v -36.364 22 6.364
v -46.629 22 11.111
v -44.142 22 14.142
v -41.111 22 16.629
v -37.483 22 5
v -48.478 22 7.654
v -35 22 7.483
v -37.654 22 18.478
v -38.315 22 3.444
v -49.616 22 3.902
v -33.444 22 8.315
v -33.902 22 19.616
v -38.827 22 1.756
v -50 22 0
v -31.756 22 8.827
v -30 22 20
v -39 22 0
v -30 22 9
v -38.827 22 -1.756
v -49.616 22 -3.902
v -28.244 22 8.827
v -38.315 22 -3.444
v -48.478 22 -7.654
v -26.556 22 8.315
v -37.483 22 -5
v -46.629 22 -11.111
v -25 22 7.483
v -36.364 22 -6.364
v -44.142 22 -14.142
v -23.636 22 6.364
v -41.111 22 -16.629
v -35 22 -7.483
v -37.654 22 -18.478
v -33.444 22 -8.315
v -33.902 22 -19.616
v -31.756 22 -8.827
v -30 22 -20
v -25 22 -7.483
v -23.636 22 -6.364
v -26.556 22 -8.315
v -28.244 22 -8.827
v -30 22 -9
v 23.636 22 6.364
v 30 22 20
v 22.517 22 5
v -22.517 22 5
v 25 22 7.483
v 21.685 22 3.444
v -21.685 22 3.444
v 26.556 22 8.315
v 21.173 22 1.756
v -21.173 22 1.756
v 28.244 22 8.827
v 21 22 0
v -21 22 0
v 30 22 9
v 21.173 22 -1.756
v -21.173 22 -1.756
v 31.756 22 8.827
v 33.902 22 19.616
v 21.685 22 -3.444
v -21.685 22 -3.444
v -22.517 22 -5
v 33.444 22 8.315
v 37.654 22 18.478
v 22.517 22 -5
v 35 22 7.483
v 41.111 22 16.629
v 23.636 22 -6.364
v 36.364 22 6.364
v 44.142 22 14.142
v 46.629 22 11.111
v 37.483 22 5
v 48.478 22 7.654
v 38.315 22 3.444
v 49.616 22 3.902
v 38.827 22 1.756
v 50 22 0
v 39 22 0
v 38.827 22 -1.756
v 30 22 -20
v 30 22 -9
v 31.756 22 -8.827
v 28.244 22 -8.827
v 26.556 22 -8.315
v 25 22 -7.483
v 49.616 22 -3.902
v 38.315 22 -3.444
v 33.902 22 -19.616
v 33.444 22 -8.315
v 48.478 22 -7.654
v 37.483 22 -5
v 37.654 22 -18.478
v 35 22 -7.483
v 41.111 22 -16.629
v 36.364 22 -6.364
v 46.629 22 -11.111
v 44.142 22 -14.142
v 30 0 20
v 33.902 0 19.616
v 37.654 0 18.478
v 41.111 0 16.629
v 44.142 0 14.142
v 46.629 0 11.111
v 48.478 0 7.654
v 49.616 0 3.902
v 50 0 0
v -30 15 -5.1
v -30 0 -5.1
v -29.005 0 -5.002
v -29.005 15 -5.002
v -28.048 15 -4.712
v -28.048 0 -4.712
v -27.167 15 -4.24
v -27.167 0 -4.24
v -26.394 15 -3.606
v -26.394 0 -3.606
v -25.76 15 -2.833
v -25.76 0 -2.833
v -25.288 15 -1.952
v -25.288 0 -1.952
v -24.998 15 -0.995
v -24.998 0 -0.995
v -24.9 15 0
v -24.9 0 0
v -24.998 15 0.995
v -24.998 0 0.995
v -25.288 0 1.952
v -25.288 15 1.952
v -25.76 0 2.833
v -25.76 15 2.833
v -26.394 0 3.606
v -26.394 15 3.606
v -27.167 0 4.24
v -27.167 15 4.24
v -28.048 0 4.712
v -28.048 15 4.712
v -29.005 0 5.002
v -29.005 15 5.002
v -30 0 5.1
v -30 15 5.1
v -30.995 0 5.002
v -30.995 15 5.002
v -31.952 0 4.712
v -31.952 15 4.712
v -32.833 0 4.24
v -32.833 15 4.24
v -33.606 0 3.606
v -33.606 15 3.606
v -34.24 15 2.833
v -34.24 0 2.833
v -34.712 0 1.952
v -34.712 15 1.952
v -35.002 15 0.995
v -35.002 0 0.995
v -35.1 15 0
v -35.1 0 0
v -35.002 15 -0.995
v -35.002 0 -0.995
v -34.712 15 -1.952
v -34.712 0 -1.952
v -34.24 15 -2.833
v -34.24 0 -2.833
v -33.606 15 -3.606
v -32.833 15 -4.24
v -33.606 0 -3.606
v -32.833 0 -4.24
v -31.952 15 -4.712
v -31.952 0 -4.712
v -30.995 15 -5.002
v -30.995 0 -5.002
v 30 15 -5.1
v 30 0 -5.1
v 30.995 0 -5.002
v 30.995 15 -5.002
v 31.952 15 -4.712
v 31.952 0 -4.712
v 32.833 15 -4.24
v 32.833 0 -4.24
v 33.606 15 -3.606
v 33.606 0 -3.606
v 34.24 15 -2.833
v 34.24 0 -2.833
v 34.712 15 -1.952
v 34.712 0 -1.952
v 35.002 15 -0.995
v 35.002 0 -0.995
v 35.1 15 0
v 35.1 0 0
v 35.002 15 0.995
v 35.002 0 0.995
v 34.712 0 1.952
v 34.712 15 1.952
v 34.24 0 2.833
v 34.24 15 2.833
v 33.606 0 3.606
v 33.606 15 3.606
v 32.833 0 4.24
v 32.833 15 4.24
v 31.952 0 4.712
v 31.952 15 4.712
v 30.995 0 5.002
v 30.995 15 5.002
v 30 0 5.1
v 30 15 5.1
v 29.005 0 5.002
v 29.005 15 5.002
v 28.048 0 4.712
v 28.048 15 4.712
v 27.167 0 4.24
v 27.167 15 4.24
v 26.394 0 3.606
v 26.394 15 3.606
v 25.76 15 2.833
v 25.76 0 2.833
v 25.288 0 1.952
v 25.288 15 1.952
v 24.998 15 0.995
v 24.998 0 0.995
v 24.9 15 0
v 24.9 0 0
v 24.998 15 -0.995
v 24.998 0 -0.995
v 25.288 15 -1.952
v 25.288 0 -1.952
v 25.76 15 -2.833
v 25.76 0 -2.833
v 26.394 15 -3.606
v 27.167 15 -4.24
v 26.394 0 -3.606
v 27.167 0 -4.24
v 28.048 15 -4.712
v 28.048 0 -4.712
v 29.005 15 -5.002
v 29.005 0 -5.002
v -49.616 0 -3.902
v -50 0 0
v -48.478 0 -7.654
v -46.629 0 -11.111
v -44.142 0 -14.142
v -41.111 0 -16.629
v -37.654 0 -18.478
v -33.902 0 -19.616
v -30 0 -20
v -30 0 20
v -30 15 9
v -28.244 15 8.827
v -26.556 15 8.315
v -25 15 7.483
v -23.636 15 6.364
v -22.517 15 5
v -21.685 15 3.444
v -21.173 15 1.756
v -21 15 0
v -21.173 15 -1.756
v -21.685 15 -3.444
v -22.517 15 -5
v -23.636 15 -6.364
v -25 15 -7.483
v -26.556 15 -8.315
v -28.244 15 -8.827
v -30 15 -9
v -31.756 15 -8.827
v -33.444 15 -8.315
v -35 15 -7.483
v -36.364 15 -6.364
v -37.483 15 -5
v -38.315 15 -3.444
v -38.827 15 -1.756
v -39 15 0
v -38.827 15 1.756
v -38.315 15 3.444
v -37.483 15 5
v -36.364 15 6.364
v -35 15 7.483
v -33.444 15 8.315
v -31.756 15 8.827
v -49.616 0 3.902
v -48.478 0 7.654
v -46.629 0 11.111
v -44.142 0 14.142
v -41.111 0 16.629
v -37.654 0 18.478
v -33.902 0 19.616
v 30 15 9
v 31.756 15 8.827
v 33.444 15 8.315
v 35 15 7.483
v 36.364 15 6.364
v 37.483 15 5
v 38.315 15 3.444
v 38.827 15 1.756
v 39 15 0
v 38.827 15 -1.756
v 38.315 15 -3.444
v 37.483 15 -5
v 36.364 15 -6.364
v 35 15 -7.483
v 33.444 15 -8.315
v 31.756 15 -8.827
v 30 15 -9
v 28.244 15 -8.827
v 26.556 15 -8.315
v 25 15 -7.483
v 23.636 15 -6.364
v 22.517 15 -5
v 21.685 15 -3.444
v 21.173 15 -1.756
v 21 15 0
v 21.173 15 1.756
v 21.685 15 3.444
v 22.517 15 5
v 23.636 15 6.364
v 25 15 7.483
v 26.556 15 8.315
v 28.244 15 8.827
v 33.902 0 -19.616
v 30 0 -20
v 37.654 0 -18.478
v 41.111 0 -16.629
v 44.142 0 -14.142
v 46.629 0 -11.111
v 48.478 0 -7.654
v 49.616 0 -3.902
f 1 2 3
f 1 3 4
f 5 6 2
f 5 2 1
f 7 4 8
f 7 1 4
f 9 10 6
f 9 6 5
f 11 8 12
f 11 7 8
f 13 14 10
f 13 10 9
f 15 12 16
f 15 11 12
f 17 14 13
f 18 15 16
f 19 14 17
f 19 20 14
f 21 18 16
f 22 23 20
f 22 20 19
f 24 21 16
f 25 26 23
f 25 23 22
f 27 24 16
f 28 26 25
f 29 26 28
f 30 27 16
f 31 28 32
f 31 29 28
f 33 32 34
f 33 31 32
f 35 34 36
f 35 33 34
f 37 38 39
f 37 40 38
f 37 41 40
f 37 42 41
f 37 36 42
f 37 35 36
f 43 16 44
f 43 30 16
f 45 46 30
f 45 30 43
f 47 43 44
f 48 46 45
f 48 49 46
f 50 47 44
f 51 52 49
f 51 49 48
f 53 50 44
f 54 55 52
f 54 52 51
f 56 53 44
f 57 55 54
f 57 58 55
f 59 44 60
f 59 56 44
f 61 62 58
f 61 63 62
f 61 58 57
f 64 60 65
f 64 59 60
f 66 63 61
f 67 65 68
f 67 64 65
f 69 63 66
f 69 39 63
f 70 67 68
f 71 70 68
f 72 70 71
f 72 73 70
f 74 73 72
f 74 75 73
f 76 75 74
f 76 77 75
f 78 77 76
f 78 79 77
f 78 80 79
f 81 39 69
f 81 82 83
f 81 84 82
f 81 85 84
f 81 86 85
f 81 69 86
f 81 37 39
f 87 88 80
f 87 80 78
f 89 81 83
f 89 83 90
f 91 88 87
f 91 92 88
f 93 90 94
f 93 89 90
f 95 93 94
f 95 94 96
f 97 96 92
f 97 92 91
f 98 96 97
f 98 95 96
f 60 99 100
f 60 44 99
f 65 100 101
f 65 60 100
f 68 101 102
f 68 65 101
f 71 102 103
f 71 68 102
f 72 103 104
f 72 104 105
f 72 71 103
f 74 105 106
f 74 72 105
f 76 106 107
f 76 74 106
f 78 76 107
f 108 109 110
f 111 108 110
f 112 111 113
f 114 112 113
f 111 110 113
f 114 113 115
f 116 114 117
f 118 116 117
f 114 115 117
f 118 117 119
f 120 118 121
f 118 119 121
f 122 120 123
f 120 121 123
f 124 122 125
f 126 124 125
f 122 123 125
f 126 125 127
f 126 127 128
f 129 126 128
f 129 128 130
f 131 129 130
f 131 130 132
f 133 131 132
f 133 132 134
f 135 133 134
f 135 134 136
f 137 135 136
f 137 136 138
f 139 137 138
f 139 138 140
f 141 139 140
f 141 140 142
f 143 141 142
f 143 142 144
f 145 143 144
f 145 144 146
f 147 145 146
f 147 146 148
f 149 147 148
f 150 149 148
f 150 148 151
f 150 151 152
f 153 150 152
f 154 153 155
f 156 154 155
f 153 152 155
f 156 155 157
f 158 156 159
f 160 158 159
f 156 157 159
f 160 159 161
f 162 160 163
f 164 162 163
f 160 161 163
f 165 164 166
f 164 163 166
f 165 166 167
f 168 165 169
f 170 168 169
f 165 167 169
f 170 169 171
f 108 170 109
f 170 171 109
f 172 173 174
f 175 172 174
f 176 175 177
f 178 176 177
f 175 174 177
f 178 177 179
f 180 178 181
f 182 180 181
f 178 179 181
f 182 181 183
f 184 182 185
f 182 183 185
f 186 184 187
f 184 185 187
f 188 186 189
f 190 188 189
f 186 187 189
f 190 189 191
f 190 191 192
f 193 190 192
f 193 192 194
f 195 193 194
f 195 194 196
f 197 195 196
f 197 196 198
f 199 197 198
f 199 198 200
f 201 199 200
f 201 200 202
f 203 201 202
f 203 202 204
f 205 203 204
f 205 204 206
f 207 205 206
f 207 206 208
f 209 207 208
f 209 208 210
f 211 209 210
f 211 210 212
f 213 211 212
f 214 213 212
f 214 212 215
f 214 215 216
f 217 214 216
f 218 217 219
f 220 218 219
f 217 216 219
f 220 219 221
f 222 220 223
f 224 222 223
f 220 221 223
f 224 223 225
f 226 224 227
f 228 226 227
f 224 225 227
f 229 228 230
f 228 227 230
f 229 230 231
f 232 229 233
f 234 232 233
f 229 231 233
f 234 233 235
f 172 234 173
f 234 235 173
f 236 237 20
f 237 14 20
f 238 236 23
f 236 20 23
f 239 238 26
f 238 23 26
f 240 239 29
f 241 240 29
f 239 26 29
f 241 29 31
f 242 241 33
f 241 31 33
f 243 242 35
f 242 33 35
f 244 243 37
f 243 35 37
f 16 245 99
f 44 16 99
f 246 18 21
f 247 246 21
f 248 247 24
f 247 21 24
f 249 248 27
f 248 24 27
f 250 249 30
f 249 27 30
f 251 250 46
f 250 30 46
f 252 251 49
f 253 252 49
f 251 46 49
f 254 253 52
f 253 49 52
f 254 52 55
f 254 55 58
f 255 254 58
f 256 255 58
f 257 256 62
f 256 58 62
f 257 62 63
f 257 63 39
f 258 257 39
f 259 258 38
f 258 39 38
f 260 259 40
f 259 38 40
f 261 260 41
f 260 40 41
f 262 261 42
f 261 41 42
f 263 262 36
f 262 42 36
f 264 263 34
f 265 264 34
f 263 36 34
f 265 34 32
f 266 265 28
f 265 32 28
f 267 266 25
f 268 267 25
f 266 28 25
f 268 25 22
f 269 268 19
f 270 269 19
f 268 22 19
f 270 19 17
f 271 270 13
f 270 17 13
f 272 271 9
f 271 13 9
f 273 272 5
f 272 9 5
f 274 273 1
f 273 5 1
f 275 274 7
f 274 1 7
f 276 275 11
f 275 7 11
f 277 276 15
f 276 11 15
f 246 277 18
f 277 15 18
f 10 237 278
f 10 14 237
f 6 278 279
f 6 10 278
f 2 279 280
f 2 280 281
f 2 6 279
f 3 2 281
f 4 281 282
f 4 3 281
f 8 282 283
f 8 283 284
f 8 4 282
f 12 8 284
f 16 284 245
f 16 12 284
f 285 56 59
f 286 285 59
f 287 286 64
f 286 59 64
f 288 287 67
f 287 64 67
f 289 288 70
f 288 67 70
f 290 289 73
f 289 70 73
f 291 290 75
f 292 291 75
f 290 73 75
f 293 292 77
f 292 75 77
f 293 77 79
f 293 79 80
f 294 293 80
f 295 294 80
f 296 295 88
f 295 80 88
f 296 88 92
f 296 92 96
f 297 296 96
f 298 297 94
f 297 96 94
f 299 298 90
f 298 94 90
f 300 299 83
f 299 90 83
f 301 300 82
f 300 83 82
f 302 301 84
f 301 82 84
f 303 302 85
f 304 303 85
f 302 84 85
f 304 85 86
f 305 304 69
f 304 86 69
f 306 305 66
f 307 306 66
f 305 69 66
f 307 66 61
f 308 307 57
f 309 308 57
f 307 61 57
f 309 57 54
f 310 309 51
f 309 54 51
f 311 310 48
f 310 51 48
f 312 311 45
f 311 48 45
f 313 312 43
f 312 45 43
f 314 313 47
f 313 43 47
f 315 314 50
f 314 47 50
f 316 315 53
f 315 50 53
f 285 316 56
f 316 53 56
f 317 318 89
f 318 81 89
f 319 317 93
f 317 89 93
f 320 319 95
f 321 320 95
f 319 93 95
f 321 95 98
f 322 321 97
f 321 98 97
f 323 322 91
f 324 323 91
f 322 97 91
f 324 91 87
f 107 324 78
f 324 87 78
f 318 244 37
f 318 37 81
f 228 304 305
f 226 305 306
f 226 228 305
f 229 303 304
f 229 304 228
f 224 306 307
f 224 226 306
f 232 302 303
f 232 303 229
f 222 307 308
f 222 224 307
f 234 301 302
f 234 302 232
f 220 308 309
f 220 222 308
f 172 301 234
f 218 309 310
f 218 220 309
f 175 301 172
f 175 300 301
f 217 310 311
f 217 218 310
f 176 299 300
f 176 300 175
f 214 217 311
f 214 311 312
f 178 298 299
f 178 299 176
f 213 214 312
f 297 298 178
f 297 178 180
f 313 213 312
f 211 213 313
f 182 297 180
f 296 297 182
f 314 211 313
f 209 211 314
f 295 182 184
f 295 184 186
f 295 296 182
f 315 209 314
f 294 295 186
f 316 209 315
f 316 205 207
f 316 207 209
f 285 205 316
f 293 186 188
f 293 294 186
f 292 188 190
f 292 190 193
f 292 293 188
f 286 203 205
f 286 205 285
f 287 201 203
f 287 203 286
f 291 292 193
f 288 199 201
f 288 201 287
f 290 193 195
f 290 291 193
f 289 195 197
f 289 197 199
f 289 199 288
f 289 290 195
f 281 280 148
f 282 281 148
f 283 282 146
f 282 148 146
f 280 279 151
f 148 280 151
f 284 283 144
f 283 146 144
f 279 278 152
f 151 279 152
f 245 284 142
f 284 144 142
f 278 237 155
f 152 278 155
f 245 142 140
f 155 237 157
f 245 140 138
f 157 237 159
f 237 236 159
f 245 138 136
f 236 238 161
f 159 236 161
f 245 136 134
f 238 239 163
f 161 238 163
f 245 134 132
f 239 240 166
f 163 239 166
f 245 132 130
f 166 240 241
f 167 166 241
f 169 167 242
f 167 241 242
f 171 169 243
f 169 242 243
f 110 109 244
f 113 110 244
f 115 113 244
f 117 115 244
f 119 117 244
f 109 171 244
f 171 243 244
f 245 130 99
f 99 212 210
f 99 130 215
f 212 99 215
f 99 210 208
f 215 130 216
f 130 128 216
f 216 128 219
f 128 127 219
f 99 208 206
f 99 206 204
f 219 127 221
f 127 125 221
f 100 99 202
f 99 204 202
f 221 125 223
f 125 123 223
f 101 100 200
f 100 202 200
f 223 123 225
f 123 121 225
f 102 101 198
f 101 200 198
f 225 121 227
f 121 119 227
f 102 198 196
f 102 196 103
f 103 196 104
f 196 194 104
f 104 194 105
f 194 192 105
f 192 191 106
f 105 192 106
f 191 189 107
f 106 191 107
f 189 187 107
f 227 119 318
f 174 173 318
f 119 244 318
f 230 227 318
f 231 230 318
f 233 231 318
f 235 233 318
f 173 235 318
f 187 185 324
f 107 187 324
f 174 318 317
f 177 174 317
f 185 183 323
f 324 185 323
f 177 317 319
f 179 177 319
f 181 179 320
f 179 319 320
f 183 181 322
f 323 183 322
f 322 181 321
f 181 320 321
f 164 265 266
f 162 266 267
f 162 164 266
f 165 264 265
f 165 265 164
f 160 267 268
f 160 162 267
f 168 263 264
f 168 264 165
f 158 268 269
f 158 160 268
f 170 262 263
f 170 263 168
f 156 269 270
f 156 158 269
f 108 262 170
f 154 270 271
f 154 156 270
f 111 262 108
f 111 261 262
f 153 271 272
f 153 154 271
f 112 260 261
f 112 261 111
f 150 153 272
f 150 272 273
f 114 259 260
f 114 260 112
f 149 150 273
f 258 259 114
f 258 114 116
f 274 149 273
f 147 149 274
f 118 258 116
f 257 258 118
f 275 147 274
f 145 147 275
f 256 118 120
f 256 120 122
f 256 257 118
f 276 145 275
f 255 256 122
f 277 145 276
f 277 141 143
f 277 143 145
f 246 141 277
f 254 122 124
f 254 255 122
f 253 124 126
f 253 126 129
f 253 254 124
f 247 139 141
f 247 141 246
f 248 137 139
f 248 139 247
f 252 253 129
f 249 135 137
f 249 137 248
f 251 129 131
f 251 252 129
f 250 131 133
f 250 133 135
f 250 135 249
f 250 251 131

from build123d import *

# Parameters (mm, degrees)
SKETCH_1_W             = 100
SKETCH_1_H             = 40
EXTRUDE_1_DEPTH        = 22
HOLE_WIZARD_M121_D     = 10.2
HOLE_WIZARD_M121_DEPTH = 26.75
HOLE_WIZARD_M121_TIP   = 3.064389157
SKETCH_5_R             = 9
CUT_EXTRUDE_1_DEPTH    = 7
FILLET_1_R             = 20


with BuildPart() as part:
    # Эскиз1 → Бобышка-Вытянуть1 (new body)
    with BuildSketch(Plane(origin=(0, 0, 0), x_dir=(1, 0, 0), z_dir=(0, 1, 0))):
        Rectangle(SKETCH_1_W, SKETCH_1_H)
    extrude(amount=EXTRUDE_1_DEPTH)

    # Отверстие обработанное метчиком M121
    with Locations(Plane(origin=(-30, 22, 0), x_dir=(0, 0, 1), z_dir=(0, 1, 0))):
        with Locations((0, 0), (0, 60)):
            Hole(HOLE_WIZARD_M121_D / 2, depth=HOLE_WIZARD_M121_DEPTH)
            with Locations((0, 0, -(HOLE_WIZARD_M121_DEPTH + HOLE_WIZARD_M121_TIP / 2))):  # 118° drill point
                Cone(0, HOLE_WIZARD_M121_D / 2, HOLE_WIZARD_M121_TIP, mode=Mode.SUBTRACT)

    # Эскиз5 → Вырез-Вытянуть1 (cut)
    with BuildSketch(Plane(origin=(0, 22, 0), x_dir=(1, 0, 0), z_dir=(0, 1, 0))):
        with Locations(Location((30, 0, 0), (0, 0, 270))):
            Circle(SKETCH_5_R)
        with Locations(Location((-30, 0, 0), (0, 0, 270))):
            Circle(SKETCH_5_R)
    extrude(amount=-CUT_EXTRUDE_1_DEPTH, mode=Mode.SUBTRACT)

    # Скругление1
    fillet_1_edges = [part.edges().sort_by_distance(p)[0] for p in [
        (50, 11, 20),
        (50, 11, -20),
        (-50, 11, -20),
        (-50, 11, 20),
    ]]
    fillet(fillet_1_edges, radius=FILLET_1_R - 0.0001)  # a hair under: the kernel refuses the full size


solid = part.part
